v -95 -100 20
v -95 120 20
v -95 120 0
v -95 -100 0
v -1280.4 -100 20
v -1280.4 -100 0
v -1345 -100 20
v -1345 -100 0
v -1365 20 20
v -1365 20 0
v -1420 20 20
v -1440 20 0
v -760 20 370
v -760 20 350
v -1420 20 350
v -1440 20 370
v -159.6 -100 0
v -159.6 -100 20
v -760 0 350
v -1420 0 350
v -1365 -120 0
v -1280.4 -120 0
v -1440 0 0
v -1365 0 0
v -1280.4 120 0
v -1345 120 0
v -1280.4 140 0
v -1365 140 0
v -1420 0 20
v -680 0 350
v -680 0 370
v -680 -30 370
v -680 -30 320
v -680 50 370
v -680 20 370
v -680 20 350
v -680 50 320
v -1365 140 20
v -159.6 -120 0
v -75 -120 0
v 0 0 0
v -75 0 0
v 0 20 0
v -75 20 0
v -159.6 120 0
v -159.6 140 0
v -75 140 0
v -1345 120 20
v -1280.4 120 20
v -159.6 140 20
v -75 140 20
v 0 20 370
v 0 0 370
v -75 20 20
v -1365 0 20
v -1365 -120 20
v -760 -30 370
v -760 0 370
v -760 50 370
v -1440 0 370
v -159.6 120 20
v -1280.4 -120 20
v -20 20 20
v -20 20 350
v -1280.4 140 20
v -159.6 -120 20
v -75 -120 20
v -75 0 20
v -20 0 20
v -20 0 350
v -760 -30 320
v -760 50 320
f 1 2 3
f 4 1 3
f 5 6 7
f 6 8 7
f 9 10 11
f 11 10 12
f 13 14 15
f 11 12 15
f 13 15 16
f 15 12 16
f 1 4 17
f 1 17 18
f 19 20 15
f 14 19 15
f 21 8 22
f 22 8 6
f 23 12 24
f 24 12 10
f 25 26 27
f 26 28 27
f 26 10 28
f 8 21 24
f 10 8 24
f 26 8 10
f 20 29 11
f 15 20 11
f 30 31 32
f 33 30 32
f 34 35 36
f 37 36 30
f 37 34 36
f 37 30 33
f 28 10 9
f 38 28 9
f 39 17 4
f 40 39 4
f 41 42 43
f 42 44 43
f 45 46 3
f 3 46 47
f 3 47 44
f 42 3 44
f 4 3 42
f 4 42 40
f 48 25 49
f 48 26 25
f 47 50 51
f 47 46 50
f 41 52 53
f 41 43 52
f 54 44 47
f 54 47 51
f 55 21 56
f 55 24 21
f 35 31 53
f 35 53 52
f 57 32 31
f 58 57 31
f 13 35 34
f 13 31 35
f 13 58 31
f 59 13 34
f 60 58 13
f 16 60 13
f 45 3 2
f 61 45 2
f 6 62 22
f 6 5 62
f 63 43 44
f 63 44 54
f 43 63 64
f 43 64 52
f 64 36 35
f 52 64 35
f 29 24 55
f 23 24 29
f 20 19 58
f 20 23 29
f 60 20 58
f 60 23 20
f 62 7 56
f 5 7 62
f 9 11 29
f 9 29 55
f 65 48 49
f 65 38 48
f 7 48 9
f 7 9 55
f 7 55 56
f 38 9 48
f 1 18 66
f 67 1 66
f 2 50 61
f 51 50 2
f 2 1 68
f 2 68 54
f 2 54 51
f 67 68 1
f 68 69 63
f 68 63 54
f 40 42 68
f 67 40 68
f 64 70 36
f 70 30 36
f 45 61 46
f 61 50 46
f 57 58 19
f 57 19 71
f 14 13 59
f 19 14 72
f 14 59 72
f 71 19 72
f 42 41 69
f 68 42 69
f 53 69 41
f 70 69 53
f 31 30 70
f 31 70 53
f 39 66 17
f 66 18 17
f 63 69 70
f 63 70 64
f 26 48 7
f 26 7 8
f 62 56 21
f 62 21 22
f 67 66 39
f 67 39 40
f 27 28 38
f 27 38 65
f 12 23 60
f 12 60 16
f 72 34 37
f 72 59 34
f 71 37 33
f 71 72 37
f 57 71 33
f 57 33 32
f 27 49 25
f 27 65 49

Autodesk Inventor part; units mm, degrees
ref_plane "YZ Plane" through (0, 0, 0) normal (1, 0, 0) x (0, 1, 0)
ref_plane "XZ Plane" through (0, 0, 0) normal (0, 1, 0) x (-1, 0, 0)
sketch "Sketch1" plane through (0, 0, 0) normal (0, 0, 1) x (1, 0, 0)
  line L0 (0, 0) -> (-1440, 0)
  line L1 (-1440, 0) -> (-1440, 20)
  line L2 (-1440, 20) -> (0, 20)
  line L3 (0, 20) -> (0, 0)
  dimension "d0" = 1440
  dimension "d1" = 20
extrude "Extrusion1" add sketch "Sketch1" along normal blind 20
sketch "Sketch2" plane through (0, 0, 20) normal (0, 0, 1) x (1, 0, 0)
  line L0 (-1440, 0) -> (0, 0) projected
  line L1 (0, 0) -> (0, 20) projected
  line L2 (0, 20) -> (-1440, 20) projected
  line L3 (-1440, 20) -> (-1440, 0) projected
  line L4 (0, 0) -> (-20, 0)
  line L5 (-20, 0) -> (-20, 20)
  line L6 (-20, 20) -> (0, 20)
  line L7 (0, 20) -> (0, 0)
  line L8 (-1440, 0) -> (-1420, 0)
  line L9 (-1420, 0) -> (-1420, 20)
  line L10 (-1420, 20) -> (-1440, 20)
  line L11 (-1440, 20) -> (-1440, 0)
  dimension "d4" = 20
  dimension "d5" = 20
extrude "Extrusion2" add sketch "Sketch2" along normal blind 350 contours L3 L2 L9 L0 | L5 L2 L1 L0
ref_plane "Work Plane1" through (-720, 0, 0) normal (1, 0, 0) x (0, 0, -1)
sketch "Sketch3" plane through (-720, 0, 0) normal (1, 0, 0) x (0, 0, -1)
  point P0 (0, 0)
sketch "Sketch4" plane through (-720, 0, 0) normal (1, 0, 0) x (0, 0, -1)
  line L0 (-20, 20) -> (-20, 0) projected
  line L1 (0, 0) -> (0, 20) projected
  line L2 (0, 0) -> (-370, 0) projected
  line L3 (-370, 20) -> (-370, 0) projected
  line L4 (0, 20) -> (-370, 20) projected
  line L5 (-20, 20) -> (0, 20)
  line L6 (0, 20) -> (0, 0)
  line L7 (0, 0) -> (-20, 0)
  line L8 (-20, 0) -> (-20, 20)
  point P0 (0, 0)
extrude "Extrusion3" cut sketch "Sketch4" along normal mid plane 1250 contours L4 L1 L2 L0
sketch "Sketch5" plane through (-1420, 0, 20) normal (1, 0, 0) x (0, 0, -1)
  line L0 (0, 20) -> (0, 0) projected
  line L1 (0, 20) -> (-350, 20) projected
  line L2 (-350, 0) -> (-350, 20) projected
  line L3 (0, 0) -> (-350, 0) projected
  line L4 (-350, 0) -> (-330, 0)
  line L5 (-330, 0) -> (-330, 20)
  line L6 (-330, 20) -> (-350, 20)
  line L7 (-350, 20) -> (-350, 0)
  point P0 (20, 0)
  dimension "d14" = 20
extrude "Extrusion4" add sketch "Sketch5" along normal blind 1401 contours L5 L3 L2 L1
sketch "Sketch7" plane through (-1440, 0, 370) normal (0, -1, 0) x (1, 0, 0)
  line L0 (95, -370) -> (95, -350) projected
  line L1 (20, -350) -> (95, -350) projected
  line L2 (20, -350) -> (20, -20) projected
  line L3 (20, -20) -> (1420, -20) projected
  line L4 (1420, -350) -> (1420, -20) projected
  line L5 (1345, -350) -> (1420, -350) projected
  line L6 (1345, -350) -> (1345, -370) projected
  line L7 (1440, -370) -> (1345, -370) projected
  line L8 (1440, -370) -> (1440, 0) projected
  line L9 (0, 0) -> (1440, 0) projected
  line L10 (0, -370) -> (0, 0) projected
  line L11 (95, -370) -> (0, -370) projected
  line L12 (1345, -370) -> (1365, -370)
  line L13 (1365, -370) -> (1365, -350)
  line L14 (1365, -350) -> (1345, -350)
  line L15 (1345, -350) -> (1345, -370)
  line L16 (20, -350) -> (95, -350) projected
  line L17 (95, -370) -> (75, -370)
  line L18 (75, -370) -> (75, -350)
  line L19 (75, -350) -> (95, -350)
  line L20 (95, -350) -> (95, -370)
  dimension "d23" = 20
  dimension "d24" = 20
extrude "Extrusion6" add sketch "Sketch7" along normal blind 120 contours L11 L18 L1 L0 | L7 L6 L5 L13
sketch "Sketch8" plane through (-1440, 20, 370) normal (0, 1, 0) x (1, 0, 0)
  line L0 (95, 350) -> (95, 370) projected
  line L1 (0, 370) -> (95, 370) projected
  line L2 (0, 370) -> (0, 0) projected
  line L3 (1440, 0) -> (0, 0) projected
  line L4 (1440, 370) -> (1440, 0) projected
  line L5 (1345, 370) -> (1440, 370) projected
  line L6 (1345, 370) -> (1345, 350) projected
  line L7 (1420, 350) -> (1345, 350) projected
  line L8 (1420, 350) -> (1420, 20) projected
  line L9 (20, 20) -> (1420, 20) projected
  line L10 (20, 350) -> (20, 20) projected
  line L11 (95, 350) -> (20, 350) projected
  line L12 (1345, 370) -> (1365, 370)
  line L13 (1365, 370) -> (1365, 350)
  line L14 (1365, 350) -> (1345, 350)
  line L15 (1345, 350) -> (1345, 370)
  line L16 (95, 370) -> (75, 370)
  line L17 (75, 370) -> (75, 350)
  line L18 (75, 350) -> (95, 350)
  line L19 (95, 350) -> (95, 370)
  dimension "d27" = 20
  dimension "d28" = 20
extrude "Extrusion7" add sketch "Sketch8" along normal blind 120 contours L11 L17 L1 L0 | L7 L6 L5 L13
sketch "Sketch9" plane through (-1345, 0, 0) normal (1, 0, 0) x (0, 0, -1)
  line L0 (-20, -120) -> (-20, 140) projected
  line L1 (0, -120) -> (-20, -120) projected
  line L2 (0, 140) -> (0, -120) projected
  line L3 (-20, 140) -> (0, 140) projected
  line L4 (-20, -120) -> (0, -120)
  line L5 (0, -120) -> (0, -100)
  line L6 (0, -100) -> (-20, -100)
  line L7 (-20, -100) -> (-20, -120)
  line L8 (0, 140) -> (0, -120) projected
  line L9 (-20, 140) -> (0, 140)
  line L10 (0, 140) -> (0, 120)
  line L11 (0, 120) -> (-20, 120)
  line L12 (-20, 120) -> (-20, 140)
  point P0 (0, 0)
  dimension "d35" = 20
  dimension "d36" = 20
extrude "Extrusion8" add sketch "Sketch9" along normal blind 1251 contours L0 L6 L2 L1 | L0 L3 L2 L11
sketch "Sketch10" plane through (-720, 0, 0) normal (1, 0, 0) x (0, 0, -1)
  line L0 (0, 0) -> (-20, 0) projected
  line L1 (0, 0) -> (0, -120) projected
  line L2 (-20, -120) -> (0, -120) projected
  line L3 (-20, 0) -> (-20, -120) projected
  line L4 (0, 120) -> (-20, 120) projected
  line L5 (0, 140) -> (-20, 140) projected
  line L6 (-20, 20) -> (-20, 140) projected
  line L7 (0, 20) -> (0, 140) projected
  line L8 (-20, -100) -> (0, -100) projected
  line L9 (-20, -120) -> (0, -120)
  line L10 (0, -120) -> (0, -100)
  line L11 (0, -100) -> (-20, -100)
  line L12 (-20, -100) -> (-20, -120)
  line L13 (-20, 120) -> (0, 120)
  line L14 (0, 120) -> (0, 140)
  line L15 (0, 140) -> (-20, 140)
  line L16 (-20, 140) -> (-20, 120)
  point P0 (0, 0)
extrude "Extrusion9" cut sketch "Sketch10" along normal mid plane 1120.8 contours L1 L2 L3 L8 | L4 L6 L5 L7
sketch "Sketch11" plane through (-720, 0, 0) normal (1, 0, 0) x (0, 0, -1)
  line L0 (-350, 20) -> (-350, 0) projected
  line L1 (-370, 20) -> (-370, 0) projected
  line L2 (0, 20) -> (-370, 20) projected
  line L3 (0, 0) -> (-370, 0) projected
  line L4 (-370, 50) -> (-320, 50)
  line L5 (-320, 50) -> (-320, -30)
  line L6 (-320, -30) -> (-370, -30)
  line L7 (-370, -30) -> (-370, 50)
  dimension "d49" = 50
  dimension "d50" = 80
  dimension "d51" = 30
extrude "Extrusion10" add sketch "Sketch11" along normal mid plane 80
properties part number "CameraMount"
